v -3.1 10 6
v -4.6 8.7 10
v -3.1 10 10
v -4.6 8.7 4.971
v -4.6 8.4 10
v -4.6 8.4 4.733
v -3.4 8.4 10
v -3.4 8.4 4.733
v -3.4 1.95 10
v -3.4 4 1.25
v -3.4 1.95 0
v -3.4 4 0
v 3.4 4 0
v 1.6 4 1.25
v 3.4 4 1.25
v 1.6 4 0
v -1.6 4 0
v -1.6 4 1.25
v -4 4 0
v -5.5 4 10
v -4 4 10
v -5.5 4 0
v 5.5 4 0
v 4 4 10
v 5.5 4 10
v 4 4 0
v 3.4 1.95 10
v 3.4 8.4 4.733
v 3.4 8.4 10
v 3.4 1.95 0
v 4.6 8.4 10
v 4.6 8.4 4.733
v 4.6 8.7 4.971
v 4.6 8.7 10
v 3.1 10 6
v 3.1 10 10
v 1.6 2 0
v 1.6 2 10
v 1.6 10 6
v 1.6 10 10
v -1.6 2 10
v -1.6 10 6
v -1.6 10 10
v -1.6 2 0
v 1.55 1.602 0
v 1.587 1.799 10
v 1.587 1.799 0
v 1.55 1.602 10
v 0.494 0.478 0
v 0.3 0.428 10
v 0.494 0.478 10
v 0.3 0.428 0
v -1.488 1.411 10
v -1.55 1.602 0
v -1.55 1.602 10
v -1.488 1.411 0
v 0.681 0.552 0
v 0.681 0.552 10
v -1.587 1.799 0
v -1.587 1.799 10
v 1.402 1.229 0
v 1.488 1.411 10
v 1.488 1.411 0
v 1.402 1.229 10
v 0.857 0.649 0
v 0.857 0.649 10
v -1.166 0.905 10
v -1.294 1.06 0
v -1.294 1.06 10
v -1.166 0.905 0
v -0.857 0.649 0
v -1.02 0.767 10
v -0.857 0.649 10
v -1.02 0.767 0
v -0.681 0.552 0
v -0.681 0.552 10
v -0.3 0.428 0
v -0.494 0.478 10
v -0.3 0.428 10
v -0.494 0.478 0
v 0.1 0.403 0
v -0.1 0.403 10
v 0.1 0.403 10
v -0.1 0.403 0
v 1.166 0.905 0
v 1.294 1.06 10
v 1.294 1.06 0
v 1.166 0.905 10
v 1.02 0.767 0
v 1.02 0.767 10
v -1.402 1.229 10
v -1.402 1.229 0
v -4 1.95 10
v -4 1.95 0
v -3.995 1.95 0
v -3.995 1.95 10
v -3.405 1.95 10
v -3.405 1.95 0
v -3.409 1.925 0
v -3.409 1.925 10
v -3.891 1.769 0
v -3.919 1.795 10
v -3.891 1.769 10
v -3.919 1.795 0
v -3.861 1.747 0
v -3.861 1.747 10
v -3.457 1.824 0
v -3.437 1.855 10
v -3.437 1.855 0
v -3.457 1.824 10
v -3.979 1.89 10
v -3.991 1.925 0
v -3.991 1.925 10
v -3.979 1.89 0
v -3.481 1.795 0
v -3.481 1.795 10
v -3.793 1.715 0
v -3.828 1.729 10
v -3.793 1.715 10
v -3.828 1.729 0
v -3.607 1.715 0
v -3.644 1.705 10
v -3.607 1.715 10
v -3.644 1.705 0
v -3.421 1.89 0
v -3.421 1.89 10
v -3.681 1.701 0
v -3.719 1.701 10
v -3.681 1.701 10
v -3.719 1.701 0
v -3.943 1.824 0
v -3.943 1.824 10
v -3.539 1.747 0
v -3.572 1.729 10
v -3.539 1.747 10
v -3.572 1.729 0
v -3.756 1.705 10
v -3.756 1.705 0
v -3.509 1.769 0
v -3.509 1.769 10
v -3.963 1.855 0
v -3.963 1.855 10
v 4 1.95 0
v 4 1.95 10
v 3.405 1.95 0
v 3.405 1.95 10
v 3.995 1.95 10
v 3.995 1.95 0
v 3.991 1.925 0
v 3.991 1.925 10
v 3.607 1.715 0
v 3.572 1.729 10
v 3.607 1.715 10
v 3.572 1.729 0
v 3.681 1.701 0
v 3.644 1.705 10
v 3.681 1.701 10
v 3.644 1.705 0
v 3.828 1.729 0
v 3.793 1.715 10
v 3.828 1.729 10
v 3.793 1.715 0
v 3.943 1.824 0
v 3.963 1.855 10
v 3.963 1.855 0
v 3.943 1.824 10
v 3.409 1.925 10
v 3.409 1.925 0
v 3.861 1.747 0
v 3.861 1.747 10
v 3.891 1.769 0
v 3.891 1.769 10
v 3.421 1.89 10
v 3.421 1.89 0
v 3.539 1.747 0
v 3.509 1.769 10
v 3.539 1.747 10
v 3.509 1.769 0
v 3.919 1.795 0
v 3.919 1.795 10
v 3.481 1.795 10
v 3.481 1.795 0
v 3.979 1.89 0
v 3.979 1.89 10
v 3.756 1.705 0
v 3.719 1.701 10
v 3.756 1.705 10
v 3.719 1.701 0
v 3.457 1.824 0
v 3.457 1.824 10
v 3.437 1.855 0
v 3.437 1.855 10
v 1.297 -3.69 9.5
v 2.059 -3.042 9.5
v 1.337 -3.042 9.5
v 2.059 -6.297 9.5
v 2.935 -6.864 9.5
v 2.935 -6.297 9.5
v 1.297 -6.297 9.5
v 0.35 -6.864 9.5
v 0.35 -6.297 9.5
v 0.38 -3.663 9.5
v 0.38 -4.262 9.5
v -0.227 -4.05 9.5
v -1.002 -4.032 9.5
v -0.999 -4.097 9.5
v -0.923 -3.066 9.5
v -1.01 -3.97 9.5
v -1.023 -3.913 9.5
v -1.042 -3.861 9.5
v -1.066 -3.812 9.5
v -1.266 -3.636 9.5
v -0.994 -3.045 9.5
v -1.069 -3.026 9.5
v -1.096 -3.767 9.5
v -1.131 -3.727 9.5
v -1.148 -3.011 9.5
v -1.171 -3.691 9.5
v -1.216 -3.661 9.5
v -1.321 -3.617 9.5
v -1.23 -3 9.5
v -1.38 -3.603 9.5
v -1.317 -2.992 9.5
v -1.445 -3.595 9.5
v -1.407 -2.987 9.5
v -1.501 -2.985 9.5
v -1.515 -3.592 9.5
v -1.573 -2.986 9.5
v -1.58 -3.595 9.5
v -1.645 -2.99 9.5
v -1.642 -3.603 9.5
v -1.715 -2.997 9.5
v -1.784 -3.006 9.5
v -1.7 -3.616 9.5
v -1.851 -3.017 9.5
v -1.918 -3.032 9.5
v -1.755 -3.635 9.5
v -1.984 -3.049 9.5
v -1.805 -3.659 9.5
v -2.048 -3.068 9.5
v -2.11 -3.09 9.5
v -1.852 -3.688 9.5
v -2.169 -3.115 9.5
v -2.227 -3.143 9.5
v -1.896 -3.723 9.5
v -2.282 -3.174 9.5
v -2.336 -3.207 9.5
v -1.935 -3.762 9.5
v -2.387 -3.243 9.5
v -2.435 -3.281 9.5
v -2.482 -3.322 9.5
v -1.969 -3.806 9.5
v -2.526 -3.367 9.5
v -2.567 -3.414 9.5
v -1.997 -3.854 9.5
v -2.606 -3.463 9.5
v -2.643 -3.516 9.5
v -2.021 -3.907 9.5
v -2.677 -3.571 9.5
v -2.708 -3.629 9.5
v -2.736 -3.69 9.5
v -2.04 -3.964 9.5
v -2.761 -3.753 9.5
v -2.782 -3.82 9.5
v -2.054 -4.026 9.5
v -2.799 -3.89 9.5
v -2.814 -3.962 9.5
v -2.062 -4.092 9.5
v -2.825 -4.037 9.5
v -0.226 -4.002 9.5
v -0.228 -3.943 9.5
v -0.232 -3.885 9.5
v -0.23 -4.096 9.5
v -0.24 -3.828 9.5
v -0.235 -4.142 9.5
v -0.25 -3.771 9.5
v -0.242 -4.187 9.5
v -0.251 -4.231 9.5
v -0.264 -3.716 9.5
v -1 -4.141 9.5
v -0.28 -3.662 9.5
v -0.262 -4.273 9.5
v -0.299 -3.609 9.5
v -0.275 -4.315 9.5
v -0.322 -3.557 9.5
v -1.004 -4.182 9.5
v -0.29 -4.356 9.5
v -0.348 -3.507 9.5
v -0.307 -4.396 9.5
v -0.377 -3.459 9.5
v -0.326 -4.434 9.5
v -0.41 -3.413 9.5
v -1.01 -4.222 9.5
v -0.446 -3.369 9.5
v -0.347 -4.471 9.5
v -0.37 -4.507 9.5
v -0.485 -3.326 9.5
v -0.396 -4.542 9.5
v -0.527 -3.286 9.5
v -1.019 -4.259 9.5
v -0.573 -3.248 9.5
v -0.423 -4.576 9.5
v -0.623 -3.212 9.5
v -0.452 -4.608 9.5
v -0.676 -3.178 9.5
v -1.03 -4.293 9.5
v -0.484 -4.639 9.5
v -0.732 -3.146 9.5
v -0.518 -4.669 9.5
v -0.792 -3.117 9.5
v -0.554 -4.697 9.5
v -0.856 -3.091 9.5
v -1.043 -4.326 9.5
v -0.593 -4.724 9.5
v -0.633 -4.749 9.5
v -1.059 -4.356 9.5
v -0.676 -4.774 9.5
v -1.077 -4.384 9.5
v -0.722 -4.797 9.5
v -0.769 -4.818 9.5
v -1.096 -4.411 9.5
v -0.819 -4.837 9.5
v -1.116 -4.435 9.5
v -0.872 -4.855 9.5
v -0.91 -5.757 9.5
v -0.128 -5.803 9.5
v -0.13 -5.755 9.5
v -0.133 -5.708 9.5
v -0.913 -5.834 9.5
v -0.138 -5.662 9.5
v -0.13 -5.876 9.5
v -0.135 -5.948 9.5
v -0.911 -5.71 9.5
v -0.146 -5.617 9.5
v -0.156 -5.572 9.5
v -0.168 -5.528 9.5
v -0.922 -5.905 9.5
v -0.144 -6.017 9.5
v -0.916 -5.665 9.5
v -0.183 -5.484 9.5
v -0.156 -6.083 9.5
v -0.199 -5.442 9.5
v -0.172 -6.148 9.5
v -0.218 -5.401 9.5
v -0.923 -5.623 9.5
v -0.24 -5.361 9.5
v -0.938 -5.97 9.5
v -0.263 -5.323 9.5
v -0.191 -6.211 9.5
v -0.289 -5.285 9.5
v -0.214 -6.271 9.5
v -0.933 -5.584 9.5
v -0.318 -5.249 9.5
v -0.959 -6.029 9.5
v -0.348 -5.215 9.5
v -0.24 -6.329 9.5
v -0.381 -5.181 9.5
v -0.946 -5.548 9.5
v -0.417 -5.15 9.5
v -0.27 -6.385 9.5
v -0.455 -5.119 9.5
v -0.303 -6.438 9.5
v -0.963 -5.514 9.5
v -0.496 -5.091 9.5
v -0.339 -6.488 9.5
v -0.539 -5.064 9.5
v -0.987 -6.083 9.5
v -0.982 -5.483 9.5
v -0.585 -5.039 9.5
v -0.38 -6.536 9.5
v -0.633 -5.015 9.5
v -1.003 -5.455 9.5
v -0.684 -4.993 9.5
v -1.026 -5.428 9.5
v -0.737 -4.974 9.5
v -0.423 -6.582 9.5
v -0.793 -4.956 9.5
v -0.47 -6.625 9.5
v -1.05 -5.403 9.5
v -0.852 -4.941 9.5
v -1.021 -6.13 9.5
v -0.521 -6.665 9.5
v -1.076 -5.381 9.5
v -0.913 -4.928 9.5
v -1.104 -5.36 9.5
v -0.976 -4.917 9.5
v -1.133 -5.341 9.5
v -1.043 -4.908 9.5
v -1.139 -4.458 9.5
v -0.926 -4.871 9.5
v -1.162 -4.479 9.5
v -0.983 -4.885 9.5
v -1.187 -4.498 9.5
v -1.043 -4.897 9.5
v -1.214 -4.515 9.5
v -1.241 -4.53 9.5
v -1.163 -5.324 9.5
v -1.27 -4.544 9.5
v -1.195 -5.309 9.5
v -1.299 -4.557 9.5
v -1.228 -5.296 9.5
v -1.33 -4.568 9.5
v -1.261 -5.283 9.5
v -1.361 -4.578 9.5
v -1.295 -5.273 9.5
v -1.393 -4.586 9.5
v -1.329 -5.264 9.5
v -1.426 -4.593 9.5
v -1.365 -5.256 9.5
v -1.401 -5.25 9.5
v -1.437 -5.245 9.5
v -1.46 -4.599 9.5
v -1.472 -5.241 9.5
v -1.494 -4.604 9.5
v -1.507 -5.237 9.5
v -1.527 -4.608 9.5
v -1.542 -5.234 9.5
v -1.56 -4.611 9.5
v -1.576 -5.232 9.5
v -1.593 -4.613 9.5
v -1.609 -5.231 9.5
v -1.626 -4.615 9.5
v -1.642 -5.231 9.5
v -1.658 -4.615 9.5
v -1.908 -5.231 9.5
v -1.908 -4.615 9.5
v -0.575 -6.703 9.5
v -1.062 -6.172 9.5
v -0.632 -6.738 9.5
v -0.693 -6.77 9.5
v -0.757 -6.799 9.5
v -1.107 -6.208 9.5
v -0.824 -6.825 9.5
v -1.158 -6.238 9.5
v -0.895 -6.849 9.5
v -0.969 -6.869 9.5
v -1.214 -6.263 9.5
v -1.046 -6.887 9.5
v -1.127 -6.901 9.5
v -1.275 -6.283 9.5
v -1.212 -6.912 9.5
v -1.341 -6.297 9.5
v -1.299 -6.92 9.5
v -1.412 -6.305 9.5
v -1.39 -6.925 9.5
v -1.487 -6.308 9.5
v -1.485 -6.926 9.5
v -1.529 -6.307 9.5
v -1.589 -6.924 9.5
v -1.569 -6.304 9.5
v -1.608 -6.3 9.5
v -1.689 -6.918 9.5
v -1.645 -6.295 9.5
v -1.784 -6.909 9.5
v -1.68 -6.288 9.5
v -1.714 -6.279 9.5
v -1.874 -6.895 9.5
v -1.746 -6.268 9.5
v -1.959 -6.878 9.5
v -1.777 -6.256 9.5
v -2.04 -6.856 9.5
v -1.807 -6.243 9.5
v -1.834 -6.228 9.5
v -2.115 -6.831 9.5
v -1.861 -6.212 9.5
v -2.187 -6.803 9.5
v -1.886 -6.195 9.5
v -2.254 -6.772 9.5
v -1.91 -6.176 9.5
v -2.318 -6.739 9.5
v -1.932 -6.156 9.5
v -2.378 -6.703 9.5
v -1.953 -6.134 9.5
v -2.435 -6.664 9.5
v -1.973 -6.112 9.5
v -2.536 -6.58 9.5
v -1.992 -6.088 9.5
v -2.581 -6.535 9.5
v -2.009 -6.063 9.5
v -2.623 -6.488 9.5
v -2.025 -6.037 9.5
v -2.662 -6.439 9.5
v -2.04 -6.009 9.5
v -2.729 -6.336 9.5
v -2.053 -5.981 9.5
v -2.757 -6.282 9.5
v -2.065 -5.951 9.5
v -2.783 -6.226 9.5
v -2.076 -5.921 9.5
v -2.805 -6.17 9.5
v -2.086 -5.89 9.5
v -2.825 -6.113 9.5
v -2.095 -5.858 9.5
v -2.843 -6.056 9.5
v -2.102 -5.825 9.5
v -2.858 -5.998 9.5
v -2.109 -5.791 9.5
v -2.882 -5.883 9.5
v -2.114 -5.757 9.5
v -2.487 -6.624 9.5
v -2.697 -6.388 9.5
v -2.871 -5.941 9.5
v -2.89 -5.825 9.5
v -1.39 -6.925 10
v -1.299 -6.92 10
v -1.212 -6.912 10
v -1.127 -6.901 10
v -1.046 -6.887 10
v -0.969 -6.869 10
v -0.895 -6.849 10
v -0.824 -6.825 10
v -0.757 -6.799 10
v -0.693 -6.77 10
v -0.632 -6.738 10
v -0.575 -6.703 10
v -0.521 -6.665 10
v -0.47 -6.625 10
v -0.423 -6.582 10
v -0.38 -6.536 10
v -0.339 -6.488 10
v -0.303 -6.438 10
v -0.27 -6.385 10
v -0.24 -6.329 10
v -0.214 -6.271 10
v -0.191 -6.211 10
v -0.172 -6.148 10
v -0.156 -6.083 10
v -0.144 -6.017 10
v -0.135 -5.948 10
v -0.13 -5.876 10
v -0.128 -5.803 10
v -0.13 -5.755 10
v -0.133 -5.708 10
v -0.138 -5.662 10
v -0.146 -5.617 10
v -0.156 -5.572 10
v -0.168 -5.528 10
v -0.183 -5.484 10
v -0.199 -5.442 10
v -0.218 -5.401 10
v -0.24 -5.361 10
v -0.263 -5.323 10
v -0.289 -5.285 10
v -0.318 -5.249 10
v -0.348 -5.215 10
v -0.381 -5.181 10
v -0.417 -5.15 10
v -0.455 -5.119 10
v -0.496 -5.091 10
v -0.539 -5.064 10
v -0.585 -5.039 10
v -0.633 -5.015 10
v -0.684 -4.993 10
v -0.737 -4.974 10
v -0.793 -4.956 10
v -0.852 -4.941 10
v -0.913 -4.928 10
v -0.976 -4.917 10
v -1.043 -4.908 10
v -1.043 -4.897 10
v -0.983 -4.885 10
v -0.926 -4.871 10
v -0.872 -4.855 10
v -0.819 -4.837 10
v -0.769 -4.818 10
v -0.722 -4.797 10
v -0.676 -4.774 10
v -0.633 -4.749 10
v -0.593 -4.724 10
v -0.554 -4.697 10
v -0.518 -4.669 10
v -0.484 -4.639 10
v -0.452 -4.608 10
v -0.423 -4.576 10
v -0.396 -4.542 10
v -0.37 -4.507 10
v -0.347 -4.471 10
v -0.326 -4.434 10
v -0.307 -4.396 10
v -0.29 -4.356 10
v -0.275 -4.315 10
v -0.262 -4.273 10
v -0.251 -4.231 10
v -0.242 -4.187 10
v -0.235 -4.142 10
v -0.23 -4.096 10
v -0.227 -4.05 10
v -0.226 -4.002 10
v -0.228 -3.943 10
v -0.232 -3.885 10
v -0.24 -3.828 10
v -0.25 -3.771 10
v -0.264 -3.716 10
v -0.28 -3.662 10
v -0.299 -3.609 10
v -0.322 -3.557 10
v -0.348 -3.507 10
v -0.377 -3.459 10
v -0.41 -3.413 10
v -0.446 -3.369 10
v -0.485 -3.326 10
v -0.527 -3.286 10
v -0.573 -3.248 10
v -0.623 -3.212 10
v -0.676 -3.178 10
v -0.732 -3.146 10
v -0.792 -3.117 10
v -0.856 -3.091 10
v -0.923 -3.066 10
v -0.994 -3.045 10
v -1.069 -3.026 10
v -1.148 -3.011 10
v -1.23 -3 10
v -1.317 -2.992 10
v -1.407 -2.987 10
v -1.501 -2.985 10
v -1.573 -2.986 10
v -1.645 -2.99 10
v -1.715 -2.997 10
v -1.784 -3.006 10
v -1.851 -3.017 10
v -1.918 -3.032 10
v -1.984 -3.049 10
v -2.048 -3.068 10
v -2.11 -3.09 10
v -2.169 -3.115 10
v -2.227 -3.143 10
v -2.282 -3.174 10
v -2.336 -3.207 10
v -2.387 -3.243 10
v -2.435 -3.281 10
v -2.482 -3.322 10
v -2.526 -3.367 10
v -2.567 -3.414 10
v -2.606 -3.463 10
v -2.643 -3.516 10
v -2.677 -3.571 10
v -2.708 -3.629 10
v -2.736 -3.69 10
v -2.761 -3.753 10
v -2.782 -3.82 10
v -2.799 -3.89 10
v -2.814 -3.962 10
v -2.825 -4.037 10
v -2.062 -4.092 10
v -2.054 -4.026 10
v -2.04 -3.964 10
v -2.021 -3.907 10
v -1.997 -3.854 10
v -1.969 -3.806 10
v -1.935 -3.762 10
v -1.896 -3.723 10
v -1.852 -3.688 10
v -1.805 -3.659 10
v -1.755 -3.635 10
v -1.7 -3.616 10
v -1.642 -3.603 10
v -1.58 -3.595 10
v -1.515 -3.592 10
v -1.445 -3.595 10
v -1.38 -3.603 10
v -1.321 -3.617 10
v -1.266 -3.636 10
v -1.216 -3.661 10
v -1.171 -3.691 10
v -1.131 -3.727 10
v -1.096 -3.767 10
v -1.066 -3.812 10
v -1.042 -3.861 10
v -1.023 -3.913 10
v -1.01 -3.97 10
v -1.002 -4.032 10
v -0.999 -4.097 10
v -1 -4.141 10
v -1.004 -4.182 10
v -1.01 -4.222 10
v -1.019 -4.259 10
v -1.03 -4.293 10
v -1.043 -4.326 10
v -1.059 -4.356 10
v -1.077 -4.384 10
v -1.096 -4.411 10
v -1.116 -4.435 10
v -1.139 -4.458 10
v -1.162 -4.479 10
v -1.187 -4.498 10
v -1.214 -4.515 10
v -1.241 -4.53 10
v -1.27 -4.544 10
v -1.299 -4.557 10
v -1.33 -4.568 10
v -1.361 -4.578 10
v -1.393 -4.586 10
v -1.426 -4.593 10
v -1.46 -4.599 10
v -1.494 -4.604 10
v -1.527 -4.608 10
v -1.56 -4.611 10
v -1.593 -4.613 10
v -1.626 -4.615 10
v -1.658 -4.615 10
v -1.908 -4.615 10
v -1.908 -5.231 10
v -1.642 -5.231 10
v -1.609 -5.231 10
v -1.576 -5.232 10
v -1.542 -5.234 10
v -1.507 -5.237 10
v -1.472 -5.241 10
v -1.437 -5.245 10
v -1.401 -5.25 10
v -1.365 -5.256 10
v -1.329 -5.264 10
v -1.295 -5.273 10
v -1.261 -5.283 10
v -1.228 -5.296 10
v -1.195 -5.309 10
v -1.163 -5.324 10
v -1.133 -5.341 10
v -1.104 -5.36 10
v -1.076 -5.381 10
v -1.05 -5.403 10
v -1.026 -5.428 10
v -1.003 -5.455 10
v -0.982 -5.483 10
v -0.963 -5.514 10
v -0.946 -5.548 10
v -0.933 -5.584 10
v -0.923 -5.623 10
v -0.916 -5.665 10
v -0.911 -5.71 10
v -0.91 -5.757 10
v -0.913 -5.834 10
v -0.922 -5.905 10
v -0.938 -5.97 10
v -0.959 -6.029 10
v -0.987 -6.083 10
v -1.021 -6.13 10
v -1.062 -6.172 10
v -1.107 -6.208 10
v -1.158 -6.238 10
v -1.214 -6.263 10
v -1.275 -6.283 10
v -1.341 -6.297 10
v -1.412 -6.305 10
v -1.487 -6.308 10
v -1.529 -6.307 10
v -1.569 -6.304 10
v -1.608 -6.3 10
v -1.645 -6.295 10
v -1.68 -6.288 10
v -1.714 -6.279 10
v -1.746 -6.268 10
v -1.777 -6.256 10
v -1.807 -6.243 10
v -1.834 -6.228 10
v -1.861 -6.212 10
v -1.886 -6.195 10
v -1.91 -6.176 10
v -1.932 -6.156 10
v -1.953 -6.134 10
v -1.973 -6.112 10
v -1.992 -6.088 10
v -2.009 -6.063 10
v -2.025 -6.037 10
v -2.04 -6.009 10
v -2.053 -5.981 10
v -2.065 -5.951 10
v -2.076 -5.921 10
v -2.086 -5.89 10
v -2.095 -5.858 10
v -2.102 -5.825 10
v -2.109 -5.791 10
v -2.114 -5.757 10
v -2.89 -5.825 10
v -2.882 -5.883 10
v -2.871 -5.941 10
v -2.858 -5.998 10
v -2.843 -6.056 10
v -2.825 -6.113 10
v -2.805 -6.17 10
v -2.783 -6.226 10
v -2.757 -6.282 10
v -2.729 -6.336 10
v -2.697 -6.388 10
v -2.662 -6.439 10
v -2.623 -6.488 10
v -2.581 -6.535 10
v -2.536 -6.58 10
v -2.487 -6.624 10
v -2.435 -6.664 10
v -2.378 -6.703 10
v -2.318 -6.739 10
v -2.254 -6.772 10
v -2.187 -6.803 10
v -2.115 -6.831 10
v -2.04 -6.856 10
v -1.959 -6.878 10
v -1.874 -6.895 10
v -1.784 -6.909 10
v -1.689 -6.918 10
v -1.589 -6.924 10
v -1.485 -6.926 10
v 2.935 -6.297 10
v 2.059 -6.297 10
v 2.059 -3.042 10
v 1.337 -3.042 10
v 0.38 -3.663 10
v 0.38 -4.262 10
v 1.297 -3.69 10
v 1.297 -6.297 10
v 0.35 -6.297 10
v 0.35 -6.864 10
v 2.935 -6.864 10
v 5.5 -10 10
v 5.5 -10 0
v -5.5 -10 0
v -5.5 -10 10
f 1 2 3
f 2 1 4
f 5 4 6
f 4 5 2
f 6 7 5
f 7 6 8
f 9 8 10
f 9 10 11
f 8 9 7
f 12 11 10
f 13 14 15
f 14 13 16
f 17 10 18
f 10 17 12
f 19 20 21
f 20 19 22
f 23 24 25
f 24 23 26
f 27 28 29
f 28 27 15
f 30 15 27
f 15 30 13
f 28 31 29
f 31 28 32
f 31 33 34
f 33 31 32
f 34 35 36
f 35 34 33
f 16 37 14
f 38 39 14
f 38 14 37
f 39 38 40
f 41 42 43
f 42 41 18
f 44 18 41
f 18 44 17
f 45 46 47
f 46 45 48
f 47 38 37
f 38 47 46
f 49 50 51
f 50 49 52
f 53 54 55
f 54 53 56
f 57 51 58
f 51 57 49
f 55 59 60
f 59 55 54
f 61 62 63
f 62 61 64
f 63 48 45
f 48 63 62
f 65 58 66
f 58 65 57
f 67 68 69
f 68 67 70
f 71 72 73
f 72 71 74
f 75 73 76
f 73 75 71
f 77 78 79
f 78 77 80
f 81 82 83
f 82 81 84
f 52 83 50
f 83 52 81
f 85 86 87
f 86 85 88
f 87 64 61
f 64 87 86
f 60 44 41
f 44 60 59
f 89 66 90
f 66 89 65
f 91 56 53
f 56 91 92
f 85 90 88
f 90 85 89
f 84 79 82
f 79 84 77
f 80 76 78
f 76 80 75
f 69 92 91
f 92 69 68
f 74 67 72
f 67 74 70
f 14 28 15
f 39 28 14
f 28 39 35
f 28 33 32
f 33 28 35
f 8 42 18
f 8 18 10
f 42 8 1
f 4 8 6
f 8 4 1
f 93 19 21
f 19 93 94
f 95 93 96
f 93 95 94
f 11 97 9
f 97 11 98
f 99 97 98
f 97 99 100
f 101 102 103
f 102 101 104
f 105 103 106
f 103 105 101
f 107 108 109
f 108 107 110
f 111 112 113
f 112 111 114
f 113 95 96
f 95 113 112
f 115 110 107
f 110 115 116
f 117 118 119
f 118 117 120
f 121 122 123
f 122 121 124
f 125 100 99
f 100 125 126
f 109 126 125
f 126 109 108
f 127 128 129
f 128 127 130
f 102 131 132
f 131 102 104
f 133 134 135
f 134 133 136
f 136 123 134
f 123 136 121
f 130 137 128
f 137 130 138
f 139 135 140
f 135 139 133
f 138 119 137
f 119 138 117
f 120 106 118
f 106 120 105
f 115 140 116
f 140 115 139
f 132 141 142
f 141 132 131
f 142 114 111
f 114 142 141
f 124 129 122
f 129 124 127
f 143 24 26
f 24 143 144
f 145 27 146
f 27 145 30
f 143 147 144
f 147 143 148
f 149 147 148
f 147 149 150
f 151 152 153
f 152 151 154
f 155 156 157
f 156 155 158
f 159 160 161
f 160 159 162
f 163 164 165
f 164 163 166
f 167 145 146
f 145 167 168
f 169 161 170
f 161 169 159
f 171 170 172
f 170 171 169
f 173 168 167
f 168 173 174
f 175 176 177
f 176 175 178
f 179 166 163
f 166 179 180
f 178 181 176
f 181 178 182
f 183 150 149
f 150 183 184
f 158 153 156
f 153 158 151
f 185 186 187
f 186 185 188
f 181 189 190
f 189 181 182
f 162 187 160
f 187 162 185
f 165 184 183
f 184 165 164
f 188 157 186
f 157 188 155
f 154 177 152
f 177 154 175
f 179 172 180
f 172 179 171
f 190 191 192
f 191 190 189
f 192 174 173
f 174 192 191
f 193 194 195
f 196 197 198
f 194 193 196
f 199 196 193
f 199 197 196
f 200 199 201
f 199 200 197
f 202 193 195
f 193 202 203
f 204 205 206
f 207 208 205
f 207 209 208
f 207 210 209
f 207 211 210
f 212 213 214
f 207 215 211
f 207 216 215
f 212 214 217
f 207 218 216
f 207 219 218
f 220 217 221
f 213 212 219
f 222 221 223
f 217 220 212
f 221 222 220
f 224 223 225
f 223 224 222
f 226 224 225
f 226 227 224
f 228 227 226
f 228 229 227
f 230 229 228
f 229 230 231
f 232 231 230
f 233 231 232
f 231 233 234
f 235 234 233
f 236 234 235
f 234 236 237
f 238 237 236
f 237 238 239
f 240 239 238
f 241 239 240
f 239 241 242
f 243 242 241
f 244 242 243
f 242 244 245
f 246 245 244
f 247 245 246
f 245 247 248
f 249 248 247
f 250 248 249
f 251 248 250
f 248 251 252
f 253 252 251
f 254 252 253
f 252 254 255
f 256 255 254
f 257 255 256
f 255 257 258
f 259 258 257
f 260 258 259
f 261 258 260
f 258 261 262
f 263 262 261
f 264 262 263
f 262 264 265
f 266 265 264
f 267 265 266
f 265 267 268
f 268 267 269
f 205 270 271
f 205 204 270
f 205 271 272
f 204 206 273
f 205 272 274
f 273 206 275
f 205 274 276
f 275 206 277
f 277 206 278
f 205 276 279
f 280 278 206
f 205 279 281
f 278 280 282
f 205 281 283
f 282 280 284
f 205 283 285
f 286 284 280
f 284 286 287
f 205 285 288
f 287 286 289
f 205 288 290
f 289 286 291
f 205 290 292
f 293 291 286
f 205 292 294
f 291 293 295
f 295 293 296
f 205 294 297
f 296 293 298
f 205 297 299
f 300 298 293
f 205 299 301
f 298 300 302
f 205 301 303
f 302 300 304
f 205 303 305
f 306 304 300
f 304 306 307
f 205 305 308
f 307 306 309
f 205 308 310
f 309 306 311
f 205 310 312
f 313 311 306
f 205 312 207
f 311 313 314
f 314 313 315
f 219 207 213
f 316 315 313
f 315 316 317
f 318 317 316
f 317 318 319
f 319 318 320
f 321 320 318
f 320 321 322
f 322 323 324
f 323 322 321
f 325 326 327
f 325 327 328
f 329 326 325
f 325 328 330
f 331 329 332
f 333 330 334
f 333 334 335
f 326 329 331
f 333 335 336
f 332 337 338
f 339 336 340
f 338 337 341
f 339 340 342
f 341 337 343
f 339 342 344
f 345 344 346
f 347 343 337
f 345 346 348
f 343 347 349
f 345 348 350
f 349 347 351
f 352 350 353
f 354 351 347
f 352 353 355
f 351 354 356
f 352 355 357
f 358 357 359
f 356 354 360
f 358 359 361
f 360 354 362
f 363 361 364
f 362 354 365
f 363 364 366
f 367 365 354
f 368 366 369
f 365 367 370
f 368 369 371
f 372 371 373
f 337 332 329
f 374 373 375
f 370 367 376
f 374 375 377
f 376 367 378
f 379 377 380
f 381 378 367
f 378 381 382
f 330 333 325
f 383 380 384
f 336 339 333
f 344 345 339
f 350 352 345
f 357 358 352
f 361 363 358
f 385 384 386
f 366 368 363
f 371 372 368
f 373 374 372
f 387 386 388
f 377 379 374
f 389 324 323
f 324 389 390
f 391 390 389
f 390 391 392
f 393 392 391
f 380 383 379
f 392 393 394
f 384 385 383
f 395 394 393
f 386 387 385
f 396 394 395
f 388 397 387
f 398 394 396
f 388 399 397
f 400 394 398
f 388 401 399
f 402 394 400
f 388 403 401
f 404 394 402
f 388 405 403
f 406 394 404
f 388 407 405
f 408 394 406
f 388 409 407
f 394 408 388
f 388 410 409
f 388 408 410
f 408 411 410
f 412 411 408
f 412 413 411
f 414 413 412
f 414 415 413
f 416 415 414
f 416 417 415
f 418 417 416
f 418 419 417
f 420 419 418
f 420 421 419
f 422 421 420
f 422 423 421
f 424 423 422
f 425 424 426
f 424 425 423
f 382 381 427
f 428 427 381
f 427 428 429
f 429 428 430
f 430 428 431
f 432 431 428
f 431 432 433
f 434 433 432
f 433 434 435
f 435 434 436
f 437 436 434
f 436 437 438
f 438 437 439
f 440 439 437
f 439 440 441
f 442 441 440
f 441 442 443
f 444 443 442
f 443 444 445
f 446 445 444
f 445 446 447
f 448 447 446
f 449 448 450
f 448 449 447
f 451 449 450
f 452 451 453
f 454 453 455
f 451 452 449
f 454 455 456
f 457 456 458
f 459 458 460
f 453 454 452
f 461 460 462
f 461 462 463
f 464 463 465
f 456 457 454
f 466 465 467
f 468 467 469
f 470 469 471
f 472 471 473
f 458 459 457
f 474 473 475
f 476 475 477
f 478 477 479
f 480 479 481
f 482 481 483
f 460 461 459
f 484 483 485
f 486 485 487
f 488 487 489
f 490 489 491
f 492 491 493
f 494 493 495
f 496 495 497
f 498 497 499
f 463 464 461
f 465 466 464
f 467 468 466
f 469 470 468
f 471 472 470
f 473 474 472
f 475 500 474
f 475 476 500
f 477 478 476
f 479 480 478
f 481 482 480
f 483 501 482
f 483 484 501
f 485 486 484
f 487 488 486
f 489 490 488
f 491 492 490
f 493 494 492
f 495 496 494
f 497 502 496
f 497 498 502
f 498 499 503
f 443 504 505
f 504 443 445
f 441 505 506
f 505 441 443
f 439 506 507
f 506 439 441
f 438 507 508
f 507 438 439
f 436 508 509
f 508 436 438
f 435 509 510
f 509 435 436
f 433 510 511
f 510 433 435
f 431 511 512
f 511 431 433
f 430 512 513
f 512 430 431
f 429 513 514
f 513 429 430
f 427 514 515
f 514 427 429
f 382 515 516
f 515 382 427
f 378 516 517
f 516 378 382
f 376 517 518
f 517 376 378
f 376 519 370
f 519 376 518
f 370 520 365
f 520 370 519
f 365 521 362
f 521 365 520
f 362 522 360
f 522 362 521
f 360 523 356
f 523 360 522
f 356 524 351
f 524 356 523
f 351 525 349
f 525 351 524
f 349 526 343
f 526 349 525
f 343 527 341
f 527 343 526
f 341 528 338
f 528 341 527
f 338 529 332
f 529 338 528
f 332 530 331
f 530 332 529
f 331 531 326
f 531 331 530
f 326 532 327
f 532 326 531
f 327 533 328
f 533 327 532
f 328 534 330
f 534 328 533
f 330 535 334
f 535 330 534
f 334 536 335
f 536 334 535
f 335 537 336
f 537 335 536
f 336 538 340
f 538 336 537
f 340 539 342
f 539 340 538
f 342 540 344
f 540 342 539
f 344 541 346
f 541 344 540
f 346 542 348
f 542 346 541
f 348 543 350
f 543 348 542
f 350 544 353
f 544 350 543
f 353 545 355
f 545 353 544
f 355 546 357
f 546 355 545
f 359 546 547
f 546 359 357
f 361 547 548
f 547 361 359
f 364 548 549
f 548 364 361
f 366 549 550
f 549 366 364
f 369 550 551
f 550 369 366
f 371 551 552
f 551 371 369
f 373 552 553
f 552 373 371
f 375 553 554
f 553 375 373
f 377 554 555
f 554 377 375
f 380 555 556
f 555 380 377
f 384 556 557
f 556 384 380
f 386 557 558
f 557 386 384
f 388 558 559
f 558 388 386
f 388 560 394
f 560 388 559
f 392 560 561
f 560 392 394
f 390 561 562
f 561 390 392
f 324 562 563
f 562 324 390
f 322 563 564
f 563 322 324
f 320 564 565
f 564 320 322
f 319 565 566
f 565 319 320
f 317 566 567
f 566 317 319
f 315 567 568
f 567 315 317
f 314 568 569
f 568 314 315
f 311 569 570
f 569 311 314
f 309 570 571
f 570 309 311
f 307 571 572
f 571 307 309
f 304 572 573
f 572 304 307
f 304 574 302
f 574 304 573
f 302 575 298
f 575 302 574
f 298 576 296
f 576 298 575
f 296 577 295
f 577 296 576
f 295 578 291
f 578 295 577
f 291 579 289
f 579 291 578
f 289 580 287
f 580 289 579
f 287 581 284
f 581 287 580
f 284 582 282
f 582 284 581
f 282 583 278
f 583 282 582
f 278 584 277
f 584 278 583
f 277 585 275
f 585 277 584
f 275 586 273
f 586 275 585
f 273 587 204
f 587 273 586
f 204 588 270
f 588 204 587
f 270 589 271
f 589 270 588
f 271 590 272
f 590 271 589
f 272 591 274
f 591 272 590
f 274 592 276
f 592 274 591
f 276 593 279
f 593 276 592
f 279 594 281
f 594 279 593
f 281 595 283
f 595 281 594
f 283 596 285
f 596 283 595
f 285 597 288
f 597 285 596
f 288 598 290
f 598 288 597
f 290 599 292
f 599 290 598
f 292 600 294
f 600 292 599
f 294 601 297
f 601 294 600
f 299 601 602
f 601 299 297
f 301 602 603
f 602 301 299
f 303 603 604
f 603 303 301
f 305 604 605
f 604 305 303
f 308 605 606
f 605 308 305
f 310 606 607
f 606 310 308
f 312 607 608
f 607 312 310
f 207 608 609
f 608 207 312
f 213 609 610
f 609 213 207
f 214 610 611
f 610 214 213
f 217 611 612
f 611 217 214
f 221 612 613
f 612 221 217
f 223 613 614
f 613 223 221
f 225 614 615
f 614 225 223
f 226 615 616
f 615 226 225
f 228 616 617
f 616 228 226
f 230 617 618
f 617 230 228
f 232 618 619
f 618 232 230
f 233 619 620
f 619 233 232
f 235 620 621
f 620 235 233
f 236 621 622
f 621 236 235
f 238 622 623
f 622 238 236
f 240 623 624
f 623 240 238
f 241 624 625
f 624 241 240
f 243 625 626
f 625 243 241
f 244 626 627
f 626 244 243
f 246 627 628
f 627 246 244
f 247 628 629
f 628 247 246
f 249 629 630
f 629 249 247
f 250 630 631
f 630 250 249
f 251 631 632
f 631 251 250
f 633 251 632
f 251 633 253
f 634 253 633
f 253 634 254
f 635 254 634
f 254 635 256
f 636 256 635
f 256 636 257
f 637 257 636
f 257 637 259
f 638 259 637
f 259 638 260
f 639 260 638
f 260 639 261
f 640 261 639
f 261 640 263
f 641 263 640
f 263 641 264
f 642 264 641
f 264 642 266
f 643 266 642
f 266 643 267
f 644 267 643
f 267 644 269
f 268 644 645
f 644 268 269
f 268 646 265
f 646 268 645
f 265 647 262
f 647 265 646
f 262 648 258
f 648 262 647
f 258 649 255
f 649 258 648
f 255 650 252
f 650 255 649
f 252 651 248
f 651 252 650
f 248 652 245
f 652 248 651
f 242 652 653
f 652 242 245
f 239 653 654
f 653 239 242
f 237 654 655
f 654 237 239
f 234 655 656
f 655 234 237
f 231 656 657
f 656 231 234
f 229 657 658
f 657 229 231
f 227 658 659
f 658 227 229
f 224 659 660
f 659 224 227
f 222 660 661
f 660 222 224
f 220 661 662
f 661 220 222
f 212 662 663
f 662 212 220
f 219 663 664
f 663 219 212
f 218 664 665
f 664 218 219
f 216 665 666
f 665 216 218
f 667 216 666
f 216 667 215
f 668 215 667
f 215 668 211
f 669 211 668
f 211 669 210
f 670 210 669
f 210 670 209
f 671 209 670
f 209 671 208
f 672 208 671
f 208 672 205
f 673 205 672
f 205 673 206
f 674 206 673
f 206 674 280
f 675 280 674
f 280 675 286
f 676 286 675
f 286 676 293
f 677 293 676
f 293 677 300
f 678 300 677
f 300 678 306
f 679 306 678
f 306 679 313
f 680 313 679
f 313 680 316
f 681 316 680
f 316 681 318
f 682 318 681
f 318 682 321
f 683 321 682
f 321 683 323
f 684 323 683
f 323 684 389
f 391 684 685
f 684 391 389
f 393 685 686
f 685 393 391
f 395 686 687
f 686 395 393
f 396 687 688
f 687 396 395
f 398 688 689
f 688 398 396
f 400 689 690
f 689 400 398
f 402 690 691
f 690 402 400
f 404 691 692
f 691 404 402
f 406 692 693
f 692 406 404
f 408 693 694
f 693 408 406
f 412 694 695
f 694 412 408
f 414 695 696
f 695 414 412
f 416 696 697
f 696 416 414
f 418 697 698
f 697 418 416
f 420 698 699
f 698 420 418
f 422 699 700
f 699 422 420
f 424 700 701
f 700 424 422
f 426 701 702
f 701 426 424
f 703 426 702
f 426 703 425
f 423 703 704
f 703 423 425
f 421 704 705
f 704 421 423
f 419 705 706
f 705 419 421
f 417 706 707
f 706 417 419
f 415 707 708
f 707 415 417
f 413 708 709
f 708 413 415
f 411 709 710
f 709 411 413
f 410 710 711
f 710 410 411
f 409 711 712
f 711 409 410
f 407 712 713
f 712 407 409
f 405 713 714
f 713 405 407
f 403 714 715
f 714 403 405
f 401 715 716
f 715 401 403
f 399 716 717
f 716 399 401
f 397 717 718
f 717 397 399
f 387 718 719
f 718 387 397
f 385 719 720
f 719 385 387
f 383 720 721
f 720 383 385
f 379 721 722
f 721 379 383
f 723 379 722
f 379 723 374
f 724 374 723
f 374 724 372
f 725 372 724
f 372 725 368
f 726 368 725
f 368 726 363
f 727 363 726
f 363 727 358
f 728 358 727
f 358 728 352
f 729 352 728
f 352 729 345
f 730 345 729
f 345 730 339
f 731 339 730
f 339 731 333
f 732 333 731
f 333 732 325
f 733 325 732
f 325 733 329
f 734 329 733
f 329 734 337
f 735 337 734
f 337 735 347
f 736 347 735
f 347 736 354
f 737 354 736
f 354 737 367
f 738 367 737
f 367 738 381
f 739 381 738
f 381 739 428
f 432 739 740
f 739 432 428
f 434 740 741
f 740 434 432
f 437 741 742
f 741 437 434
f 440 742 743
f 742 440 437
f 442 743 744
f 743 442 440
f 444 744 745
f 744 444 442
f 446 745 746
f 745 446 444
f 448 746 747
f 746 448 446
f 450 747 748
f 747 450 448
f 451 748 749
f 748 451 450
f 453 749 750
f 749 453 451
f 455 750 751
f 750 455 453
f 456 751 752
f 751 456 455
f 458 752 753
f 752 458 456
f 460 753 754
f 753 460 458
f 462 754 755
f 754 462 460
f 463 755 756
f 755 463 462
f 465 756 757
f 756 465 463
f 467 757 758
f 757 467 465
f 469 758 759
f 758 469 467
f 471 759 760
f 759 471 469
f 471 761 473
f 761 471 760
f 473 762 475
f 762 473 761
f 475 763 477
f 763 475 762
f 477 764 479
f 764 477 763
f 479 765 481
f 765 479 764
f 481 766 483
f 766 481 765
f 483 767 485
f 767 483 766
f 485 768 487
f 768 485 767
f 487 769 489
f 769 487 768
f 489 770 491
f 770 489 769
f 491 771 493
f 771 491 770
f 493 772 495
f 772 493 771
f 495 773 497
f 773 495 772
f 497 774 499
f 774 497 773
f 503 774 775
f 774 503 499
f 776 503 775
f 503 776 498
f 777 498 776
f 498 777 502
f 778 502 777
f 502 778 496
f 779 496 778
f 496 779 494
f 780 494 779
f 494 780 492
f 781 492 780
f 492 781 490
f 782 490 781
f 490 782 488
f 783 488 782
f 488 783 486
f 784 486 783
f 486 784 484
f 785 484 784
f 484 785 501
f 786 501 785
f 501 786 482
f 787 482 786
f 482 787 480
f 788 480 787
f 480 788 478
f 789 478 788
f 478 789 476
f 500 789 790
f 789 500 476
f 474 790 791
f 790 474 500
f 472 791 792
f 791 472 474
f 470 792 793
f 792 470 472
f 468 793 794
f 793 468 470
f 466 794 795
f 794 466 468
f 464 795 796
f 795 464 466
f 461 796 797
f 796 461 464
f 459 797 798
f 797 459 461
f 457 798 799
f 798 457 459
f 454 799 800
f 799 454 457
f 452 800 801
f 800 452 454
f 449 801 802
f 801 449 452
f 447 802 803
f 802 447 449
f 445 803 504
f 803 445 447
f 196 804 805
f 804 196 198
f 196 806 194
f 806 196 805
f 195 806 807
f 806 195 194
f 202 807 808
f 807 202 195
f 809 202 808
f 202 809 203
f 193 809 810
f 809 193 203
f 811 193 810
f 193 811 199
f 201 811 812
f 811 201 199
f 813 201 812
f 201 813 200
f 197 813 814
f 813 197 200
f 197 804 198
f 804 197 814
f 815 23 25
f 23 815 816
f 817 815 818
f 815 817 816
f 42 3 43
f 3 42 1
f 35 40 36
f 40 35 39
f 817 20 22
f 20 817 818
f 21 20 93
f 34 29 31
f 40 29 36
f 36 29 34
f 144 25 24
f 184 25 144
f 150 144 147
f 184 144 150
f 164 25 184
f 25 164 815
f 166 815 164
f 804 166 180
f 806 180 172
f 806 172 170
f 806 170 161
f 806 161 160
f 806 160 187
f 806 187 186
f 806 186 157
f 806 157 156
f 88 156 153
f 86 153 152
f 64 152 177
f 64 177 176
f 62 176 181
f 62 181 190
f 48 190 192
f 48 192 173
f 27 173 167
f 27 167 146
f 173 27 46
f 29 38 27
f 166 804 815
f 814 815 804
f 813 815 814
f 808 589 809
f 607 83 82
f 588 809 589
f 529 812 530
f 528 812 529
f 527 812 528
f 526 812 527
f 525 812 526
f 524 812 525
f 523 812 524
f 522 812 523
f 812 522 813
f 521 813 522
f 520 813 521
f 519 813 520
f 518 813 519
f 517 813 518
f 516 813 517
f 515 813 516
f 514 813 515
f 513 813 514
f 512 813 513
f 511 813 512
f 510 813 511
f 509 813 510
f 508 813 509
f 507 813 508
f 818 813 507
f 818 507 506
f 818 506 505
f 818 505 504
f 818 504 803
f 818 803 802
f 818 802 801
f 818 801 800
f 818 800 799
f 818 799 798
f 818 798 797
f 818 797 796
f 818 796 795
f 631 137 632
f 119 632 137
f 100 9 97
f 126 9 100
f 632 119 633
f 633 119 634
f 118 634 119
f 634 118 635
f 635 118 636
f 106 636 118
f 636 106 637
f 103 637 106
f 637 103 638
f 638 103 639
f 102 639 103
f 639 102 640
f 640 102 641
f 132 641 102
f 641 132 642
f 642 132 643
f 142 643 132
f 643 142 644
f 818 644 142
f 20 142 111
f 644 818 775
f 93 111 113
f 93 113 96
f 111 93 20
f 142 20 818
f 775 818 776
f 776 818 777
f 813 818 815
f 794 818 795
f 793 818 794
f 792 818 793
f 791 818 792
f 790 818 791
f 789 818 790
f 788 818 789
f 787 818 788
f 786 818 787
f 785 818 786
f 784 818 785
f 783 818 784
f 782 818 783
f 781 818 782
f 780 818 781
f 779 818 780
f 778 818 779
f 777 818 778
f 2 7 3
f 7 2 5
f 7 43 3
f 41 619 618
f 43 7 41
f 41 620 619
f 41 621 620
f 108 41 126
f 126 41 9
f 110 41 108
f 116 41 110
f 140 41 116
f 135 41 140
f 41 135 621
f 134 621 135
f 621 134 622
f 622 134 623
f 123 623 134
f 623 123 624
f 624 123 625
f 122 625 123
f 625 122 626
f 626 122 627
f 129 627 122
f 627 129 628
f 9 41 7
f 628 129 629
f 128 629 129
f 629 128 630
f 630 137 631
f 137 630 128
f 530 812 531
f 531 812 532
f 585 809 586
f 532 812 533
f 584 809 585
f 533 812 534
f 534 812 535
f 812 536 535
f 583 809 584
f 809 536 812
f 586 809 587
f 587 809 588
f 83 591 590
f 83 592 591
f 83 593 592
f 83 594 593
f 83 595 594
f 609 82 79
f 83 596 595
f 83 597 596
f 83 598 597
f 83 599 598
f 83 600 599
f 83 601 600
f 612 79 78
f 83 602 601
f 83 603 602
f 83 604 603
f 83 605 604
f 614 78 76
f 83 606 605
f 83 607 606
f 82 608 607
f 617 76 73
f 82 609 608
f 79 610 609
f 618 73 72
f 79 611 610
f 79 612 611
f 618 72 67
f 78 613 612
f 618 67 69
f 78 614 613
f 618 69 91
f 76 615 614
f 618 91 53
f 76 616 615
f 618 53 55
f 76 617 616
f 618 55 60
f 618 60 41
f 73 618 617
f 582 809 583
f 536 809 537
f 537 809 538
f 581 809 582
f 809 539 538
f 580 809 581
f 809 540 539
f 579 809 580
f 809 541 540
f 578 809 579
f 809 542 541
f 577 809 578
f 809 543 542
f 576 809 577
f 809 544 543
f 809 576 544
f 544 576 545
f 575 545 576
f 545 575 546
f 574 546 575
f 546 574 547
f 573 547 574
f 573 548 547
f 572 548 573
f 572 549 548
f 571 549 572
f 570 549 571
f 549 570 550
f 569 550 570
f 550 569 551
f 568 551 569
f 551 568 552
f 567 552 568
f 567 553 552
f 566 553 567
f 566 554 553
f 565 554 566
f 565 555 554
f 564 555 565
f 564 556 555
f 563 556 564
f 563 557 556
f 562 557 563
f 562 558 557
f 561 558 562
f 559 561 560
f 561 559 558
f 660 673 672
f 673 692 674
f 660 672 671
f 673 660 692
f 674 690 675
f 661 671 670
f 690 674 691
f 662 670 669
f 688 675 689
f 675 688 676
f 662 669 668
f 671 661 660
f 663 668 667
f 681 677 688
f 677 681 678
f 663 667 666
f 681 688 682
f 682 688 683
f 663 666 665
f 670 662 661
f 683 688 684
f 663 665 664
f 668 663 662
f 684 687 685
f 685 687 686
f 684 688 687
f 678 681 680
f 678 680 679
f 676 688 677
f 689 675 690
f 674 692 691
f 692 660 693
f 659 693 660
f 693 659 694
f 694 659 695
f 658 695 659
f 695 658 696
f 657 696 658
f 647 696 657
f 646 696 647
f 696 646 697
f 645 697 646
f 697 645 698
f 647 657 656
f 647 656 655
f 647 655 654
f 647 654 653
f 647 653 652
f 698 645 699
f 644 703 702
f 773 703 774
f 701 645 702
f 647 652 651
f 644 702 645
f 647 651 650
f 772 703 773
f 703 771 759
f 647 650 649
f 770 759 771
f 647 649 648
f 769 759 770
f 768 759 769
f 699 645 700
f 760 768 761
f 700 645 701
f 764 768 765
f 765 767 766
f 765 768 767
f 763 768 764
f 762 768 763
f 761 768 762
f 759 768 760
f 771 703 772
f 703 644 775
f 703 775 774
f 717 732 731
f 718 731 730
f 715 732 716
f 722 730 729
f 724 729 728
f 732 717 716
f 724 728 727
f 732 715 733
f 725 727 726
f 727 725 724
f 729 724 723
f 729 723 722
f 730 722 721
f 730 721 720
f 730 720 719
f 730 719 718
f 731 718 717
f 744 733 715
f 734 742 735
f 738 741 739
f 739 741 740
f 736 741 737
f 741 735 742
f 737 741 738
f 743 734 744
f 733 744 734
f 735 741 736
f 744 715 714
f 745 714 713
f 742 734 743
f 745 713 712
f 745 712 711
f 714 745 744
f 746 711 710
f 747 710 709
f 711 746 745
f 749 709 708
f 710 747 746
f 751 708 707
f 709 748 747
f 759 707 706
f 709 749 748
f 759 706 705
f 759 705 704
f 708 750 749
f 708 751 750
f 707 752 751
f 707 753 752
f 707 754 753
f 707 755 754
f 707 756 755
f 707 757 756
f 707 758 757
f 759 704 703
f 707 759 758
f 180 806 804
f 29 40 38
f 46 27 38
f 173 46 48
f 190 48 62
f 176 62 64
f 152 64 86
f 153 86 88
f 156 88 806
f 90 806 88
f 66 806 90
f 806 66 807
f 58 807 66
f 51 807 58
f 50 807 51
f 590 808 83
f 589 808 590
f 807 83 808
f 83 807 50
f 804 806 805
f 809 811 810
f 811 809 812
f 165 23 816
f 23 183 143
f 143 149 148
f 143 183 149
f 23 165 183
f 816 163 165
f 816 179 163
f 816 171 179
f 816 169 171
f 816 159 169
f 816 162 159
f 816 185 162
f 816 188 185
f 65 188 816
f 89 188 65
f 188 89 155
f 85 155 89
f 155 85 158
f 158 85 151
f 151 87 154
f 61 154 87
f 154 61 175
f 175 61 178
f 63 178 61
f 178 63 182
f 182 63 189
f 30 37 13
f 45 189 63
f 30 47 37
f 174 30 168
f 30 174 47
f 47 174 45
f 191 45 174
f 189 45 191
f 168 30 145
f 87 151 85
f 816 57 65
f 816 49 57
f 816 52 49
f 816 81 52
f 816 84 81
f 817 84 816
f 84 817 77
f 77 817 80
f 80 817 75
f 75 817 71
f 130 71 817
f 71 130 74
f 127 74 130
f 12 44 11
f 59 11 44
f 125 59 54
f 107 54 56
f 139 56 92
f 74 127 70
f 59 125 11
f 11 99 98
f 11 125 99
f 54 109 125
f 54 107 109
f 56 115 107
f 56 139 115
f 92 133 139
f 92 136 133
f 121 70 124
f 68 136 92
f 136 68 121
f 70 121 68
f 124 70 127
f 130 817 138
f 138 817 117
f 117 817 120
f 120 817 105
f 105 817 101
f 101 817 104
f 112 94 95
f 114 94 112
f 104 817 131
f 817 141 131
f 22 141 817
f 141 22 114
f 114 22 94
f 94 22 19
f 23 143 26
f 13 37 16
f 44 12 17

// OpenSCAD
$fn = 50;

difference() {
	union() {
		translate(v = [0, 4.0, 0]) {
			rotate(a = [90, 0, 0]) {
				difference() {
					union() {
						translate(v = [-5.5, 0, -6.0]) {
							cube(size = [11.0, 10.0, 20.0]);
						}
					}
					union() {
						translate(v = [0, 0, 0]) {
							rotate(a = [0, 0, 0]) {
								difference() {
									union() {
										translate(v = [0, 10.1, 0]) {
											rotate(a = [90, 0, 0]) {
												linear_extrude(height = 10.2) {
													polygon(points = [[-3.1, -6.1], [-3.1, -6.0], [-4.6, -4.7], [-4.6, -4.4], [-3.4, -4.4], [-3.4, 0], [-5.6, 0], [-5.6, -6.1]]);
												}
											}
										}
										translate(v = [0, 10.1, 0]) {
											rotate(a = [90, 0, 0]) {
												linear_extrude(height = 10.2) {
													polygon(points = [[3.1, -6.1], [3.1, -6.0], [4.6, -4.7], [4.6, -4.4], [3.4, -4.4], [3.4, 0], [5.6, 0], [5.6, -6.1]]);
												}
											}
										}
										translate(v = [-1.5999999999999999, -0.1, -6.1]) {
											cube(size = [3.1999999999999997, 10.2, 8.1]);
										}
										translate(v = [0, 10.1, 2.0]) {
											rotate(a = [90, 0, 0]) {
												cylinder(h = 10.2, r = 1.5999999999999999);
											}
										}
									}
									union();
								}
							}
						}
						translate(v = [0, 0, 212.0]) {
							rotate(a = [0, 180, 0]) {
								difference() {
									union() {
										translate(v = [0, 10.1, 0]) {
											rotate(a = [90, 0, 0]) {
												linear_extrude(height = 10.2) {
													polygon(points = [[-3.1, -6.1], [-3.1, -6.0], [-4.6, -4.7], [-4.6, -4.4], [-3.4, -4.4], [-3.4, 0], [-5.6, 0], [-5.6, -6.1]]);
												}
											}
										}
										translate(v = [0, 10.1, 0]) {
											rotate(a = [90, 0, 0]) {
												linear_extrude(height = 10.2) {
													polygon(points = [[3.1, -6.1], [3.1, -6.0], [4.6, -4.7], [4.6, -4.4], [3.4, -4.4], [3.4, 0], [5.6, 0], [5.6, -6.1]]);
												}
											}
										}
										translate(v = [-1.5999999999999999, -0.1, -6.1]) {
											cube(size = [3.1999999999999997, 10.2, 8.1]);
										}
										translate(v = [0, 10.1, 2.0]) {
											rotate(a = [90, 0, 0]) {
												cylinder(h = 10.2, r = 1.5999999999999999);
											}
										}
									}
									union();
								}
							}
						}
						translate(v = [-5.6, 0, 0]) {
							rotate(a = [90, 0, 90]) {
								linear_extrude(height = 11.2) {
									polygon(points = [[-0.1, -6.1], [6.079166666666667, -6.1], [1.25, 0], [-0.1, 0]]);
								}
							}
						}
						translate(v = [0, 10.1, 0]) {
							rotate(a = [90, 0, 0]) {
								linear_extrude(height = 10.2) {
									polygon(points = [[-3.4, -0.1], [-4.0, -0.1], [-4.0, 2.05], [-3.4, 2.05]]);
								}
							}
						}
						translate(v = [-3.6999999999999997, 10.1, 2.0]) {
							rotate(a = [90, 0, 0]) {
								cylinder(h = 10.2, r = 0.3);
							}
						}
						translate(v = [0, 10.1, 0]) {
							rotate(a = [90, 0, 0]) {
								linear_extrude(height = 10.2) {
									polygon(points = [[3.4, -0.1], [4.0, -0.1], [4.0, 2.05], [3.4, 2.05]]);
								}
							}
						}
						translate(v = [3.6999999999999997, 10.1, 2.0]) {
							rotate(a = [90, 0, 0]) {
								cylinder(h = 10.2, r = 0.3);
							}
						}
						translate(v = [-5.6, 0, 0]) {
							rotate(a = [90, 0, 90]) {
								linear_extrude(height = 11.2) {
									polygon(points = [[-0.1, 218.1], [6.079166666666667, 218.1], [1.25, 212.0], [-0.1, 212.0]]);
								}
							}
						}
						translate(v = [0, 10.1, 0]) {
							rotate(a = [90, 0, 0]) {
								linear_extrude(height = 10.2) {
									polygon(points = [[-3.4, 212.1], [-4.0, 212.1], [-4.0, 209.95], [-3.4, 209.95]]);
								}
							}
						}
						translate(v = [-3.6999999999999997, 10.1, 210.0]) {
							rotate(a = [90, 0, 0]) {
								cylinder(h = 10.2, r = 0.3);
							}
						}
						translate(v = [0, 10.1, 0]) {
							rotate(a = [90, 0, 0]) {
								linear_extrude(height = 10.2) {
									polygon(points = [[3.4, 212.1], [4.0, 212.1], [4.0, 209.95], [3.4, 209.95]]);
								}
							}
						}
						translate(v = [3.6999999999999997, 10.1, 210.0]) {
							rotate(a = [90, 0, 0]) {
								cylinder(h = 10.2, r = 0.3);
							}
						}
						translate(v = [-5.6, 0, 0]) {
							rotate(a = [90, 0, 90]) {
								linear_extrude(height = 11.2) {
									polygon(points = [[10.1, 14.5], [10.1, 197.5], [4.0, 190.3], [4.0, 21.7]]);
								}
							}
						}
						translate(v = [0, 9.5, 9.0]) {
							rotate(a = [-90, 0, 0]) {
								linear_extrude(height = 0.6) {
									text(font = "Arial:style=Bold", halign = "center", size = 4.0, text = "31", valign = "center");
								}
							}
						}
					}
				}
			}
		}
	}
	union();
}
